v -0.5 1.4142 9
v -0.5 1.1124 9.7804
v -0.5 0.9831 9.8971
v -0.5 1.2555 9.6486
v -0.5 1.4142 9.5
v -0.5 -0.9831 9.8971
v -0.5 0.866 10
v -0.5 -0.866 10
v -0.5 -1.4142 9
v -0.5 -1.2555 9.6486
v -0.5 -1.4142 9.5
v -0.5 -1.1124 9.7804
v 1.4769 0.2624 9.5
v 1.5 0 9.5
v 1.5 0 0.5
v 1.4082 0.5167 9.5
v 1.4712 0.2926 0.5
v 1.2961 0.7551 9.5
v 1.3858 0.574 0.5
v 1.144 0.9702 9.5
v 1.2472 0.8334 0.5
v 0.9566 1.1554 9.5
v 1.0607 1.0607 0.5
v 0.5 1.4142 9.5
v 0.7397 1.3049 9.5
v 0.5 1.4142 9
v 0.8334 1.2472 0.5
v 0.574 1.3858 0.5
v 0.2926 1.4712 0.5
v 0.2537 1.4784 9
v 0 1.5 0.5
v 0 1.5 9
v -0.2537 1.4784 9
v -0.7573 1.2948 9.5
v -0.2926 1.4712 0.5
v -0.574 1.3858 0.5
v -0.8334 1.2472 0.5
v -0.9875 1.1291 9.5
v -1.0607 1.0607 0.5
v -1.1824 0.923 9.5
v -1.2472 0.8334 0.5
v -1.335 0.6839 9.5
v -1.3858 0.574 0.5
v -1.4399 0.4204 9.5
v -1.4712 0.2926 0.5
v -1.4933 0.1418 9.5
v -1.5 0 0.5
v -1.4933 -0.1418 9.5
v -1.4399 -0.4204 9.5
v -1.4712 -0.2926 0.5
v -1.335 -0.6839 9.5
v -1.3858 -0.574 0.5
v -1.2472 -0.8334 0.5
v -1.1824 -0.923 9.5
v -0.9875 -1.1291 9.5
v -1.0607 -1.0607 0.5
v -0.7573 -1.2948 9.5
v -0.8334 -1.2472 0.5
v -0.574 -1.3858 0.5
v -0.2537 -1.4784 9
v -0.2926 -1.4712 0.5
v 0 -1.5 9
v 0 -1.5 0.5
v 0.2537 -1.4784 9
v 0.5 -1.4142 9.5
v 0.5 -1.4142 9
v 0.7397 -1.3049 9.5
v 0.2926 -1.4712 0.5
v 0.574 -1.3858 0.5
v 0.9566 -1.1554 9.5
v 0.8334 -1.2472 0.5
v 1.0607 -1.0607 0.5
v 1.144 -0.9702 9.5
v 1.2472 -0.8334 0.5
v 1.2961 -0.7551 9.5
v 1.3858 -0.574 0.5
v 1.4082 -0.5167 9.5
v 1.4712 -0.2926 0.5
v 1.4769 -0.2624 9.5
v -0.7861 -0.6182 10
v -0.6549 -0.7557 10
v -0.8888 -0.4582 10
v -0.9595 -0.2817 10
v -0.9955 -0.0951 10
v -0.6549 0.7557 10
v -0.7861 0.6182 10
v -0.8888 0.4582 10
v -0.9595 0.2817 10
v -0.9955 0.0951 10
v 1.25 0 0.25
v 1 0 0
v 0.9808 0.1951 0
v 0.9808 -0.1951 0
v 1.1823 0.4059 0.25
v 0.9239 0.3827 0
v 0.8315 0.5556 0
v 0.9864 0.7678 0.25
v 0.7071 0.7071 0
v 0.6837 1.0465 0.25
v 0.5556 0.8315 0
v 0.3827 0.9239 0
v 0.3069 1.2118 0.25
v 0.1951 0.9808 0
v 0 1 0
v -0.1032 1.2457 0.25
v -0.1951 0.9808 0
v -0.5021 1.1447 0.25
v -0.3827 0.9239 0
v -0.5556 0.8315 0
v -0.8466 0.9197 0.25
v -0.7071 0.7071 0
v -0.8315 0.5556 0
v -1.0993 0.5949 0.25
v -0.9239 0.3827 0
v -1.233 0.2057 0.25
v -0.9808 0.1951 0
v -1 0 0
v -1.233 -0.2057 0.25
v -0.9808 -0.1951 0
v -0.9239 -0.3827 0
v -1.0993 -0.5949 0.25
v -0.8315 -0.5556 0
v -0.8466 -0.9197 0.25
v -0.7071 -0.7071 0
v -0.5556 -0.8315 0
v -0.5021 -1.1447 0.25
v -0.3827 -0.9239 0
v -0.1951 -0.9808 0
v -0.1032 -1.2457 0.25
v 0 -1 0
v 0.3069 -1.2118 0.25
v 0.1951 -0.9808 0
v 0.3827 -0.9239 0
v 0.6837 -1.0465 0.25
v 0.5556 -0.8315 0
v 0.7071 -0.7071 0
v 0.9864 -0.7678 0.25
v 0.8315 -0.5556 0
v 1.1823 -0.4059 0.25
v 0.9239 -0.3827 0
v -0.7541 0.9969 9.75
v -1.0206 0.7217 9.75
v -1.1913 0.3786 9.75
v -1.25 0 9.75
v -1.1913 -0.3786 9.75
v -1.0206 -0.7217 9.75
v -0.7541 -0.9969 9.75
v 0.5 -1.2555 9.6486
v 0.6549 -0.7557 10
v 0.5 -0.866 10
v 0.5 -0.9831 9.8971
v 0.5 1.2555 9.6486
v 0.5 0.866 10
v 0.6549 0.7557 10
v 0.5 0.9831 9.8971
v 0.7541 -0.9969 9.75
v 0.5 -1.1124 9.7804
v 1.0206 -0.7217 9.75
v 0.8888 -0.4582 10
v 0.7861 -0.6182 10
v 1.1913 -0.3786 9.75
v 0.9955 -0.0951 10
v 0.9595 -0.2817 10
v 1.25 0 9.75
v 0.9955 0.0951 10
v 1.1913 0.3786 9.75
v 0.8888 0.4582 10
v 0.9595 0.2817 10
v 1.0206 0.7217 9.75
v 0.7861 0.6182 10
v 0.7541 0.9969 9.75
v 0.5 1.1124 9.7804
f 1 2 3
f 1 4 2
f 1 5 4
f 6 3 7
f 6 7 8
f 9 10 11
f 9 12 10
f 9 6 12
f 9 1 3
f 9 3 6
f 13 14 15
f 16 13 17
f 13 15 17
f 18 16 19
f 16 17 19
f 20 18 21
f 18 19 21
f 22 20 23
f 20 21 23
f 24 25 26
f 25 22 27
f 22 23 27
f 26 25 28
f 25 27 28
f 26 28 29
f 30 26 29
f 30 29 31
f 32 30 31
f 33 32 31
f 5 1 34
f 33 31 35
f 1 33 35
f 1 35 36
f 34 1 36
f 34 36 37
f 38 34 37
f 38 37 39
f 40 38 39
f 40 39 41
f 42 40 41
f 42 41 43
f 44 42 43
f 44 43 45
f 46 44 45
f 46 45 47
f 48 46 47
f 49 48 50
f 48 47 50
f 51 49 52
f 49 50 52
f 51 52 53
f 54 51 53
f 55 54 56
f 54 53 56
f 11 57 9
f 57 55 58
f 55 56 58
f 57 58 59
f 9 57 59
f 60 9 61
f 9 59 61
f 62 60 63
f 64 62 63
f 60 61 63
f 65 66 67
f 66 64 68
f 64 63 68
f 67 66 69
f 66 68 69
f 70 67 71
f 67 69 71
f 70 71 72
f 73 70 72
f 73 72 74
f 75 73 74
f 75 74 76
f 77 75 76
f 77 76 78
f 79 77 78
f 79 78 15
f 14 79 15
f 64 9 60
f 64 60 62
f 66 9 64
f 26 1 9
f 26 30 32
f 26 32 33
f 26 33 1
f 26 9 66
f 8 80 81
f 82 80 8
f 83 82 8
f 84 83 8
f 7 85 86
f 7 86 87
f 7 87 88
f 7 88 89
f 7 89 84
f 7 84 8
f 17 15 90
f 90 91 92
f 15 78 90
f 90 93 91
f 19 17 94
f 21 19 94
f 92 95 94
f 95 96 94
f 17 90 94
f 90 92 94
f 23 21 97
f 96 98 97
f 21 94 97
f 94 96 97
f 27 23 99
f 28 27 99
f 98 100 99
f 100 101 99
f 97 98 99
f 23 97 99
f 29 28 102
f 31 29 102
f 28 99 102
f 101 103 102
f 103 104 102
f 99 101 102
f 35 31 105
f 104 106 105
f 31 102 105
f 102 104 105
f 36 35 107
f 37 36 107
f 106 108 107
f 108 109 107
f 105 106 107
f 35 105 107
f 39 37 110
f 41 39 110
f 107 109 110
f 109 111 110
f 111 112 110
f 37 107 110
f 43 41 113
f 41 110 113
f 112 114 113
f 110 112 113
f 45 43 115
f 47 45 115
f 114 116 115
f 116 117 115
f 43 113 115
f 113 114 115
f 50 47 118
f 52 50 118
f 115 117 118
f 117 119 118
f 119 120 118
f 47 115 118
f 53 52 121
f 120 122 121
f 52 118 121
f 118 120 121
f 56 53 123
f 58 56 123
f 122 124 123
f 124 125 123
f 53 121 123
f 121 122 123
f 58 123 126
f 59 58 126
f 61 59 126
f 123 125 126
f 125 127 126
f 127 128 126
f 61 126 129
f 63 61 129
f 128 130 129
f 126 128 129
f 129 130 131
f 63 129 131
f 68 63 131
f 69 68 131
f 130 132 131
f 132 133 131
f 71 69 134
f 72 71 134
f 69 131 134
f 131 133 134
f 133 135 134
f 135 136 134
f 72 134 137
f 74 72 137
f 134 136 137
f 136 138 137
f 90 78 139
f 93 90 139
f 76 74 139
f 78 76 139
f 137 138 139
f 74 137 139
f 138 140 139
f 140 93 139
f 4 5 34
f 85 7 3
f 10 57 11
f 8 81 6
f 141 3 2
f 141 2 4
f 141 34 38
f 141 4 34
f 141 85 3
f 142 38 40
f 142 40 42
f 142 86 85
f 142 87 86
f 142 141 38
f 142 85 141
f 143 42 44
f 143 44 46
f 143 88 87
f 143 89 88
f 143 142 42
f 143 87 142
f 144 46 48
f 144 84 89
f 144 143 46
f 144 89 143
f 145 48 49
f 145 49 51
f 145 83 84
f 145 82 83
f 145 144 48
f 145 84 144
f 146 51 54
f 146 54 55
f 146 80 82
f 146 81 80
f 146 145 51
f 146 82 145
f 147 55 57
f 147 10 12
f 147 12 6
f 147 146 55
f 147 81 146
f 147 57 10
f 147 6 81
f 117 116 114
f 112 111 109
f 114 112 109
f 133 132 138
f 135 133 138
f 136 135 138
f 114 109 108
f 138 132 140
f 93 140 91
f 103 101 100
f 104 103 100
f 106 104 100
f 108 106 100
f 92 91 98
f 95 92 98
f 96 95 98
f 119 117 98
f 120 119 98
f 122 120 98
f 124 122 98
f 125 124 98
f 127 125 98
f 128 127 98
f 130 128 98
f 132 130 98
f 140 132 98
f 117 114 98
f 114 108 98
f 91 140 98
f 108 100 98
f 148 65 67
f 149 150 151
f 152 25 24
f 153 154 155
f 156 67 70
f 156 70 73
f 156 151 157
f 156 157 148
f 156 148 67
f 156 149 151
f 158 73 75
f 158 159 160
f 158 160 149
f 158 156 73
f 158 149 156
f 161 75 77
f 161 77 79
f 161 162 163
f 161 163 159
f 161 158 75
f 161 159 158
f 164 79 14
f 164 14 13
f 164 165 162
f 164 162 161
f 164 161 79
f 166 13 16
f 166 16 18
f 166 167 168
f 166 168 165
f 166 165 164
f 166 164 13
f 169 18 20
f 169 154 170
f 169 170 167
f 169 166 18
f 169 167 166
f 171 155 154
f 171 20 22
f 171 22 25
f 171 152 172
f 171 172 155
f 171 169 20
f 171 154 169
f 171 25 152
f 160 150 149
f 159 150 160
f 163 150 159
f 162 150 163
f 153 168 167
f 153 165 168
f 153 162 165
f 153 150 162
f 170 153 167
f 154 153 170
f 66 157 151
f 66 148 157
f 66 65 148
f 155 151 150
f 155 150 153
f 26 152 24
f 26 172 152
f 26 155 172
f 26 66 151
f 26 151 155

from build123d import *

# Parameters (mm, degrees)
SKETCH1_R           = 1.5
BOSS_EXTRUDE1_DEPTH = 10
CHAMFER1_SIZE       = 0.5
CUT_EXTRUDE1_START  = -1
CUT_EXTRUDE1_DEPTH  = 1


with BuildPart() as part:
    # Sketch1 → Boss-Extrude1 (new body)
    with BuildSketch(Plane.XY):
        Circle(SKETCH1_R)
    extrude(amount=BOSS_EXTRUDE1_DEPTH)

    # Chamfer1
    chamfer1_edges = [part.edges().sort_by_distance(p)[0] for p in [
        (-1.5, 0, 0),
        (-1.5, 0, 10),
    ]]
    chamfer(chamfer1_edges, length=CHAMFER1_SIZE)

    # Sketch2 → Cut-Extrude1 (cut)
    with BuildSketch(Plane.XY.offset(10).offset(CUT_EXTRUDE1_START)):
        with BuildLine():
            Line((-0.5, 1.414213562), (-0.5, -1.414213562))
            ThreePointArc((-0.5, -1.414213562), (0, -1.5), (0.5, -1.414213562))
            Line((0.5, -1.414213562), (0.5, 1.414213562))
            ThreePointArc((0.5, 1.414213562), (0, 1.5), (-0.5, 1.414213562))
        make_face()
    extrude(amount=CUT_EXTRUDE1_DEPTH, mode=Mode.SUBTRACT)


solid = part.part
